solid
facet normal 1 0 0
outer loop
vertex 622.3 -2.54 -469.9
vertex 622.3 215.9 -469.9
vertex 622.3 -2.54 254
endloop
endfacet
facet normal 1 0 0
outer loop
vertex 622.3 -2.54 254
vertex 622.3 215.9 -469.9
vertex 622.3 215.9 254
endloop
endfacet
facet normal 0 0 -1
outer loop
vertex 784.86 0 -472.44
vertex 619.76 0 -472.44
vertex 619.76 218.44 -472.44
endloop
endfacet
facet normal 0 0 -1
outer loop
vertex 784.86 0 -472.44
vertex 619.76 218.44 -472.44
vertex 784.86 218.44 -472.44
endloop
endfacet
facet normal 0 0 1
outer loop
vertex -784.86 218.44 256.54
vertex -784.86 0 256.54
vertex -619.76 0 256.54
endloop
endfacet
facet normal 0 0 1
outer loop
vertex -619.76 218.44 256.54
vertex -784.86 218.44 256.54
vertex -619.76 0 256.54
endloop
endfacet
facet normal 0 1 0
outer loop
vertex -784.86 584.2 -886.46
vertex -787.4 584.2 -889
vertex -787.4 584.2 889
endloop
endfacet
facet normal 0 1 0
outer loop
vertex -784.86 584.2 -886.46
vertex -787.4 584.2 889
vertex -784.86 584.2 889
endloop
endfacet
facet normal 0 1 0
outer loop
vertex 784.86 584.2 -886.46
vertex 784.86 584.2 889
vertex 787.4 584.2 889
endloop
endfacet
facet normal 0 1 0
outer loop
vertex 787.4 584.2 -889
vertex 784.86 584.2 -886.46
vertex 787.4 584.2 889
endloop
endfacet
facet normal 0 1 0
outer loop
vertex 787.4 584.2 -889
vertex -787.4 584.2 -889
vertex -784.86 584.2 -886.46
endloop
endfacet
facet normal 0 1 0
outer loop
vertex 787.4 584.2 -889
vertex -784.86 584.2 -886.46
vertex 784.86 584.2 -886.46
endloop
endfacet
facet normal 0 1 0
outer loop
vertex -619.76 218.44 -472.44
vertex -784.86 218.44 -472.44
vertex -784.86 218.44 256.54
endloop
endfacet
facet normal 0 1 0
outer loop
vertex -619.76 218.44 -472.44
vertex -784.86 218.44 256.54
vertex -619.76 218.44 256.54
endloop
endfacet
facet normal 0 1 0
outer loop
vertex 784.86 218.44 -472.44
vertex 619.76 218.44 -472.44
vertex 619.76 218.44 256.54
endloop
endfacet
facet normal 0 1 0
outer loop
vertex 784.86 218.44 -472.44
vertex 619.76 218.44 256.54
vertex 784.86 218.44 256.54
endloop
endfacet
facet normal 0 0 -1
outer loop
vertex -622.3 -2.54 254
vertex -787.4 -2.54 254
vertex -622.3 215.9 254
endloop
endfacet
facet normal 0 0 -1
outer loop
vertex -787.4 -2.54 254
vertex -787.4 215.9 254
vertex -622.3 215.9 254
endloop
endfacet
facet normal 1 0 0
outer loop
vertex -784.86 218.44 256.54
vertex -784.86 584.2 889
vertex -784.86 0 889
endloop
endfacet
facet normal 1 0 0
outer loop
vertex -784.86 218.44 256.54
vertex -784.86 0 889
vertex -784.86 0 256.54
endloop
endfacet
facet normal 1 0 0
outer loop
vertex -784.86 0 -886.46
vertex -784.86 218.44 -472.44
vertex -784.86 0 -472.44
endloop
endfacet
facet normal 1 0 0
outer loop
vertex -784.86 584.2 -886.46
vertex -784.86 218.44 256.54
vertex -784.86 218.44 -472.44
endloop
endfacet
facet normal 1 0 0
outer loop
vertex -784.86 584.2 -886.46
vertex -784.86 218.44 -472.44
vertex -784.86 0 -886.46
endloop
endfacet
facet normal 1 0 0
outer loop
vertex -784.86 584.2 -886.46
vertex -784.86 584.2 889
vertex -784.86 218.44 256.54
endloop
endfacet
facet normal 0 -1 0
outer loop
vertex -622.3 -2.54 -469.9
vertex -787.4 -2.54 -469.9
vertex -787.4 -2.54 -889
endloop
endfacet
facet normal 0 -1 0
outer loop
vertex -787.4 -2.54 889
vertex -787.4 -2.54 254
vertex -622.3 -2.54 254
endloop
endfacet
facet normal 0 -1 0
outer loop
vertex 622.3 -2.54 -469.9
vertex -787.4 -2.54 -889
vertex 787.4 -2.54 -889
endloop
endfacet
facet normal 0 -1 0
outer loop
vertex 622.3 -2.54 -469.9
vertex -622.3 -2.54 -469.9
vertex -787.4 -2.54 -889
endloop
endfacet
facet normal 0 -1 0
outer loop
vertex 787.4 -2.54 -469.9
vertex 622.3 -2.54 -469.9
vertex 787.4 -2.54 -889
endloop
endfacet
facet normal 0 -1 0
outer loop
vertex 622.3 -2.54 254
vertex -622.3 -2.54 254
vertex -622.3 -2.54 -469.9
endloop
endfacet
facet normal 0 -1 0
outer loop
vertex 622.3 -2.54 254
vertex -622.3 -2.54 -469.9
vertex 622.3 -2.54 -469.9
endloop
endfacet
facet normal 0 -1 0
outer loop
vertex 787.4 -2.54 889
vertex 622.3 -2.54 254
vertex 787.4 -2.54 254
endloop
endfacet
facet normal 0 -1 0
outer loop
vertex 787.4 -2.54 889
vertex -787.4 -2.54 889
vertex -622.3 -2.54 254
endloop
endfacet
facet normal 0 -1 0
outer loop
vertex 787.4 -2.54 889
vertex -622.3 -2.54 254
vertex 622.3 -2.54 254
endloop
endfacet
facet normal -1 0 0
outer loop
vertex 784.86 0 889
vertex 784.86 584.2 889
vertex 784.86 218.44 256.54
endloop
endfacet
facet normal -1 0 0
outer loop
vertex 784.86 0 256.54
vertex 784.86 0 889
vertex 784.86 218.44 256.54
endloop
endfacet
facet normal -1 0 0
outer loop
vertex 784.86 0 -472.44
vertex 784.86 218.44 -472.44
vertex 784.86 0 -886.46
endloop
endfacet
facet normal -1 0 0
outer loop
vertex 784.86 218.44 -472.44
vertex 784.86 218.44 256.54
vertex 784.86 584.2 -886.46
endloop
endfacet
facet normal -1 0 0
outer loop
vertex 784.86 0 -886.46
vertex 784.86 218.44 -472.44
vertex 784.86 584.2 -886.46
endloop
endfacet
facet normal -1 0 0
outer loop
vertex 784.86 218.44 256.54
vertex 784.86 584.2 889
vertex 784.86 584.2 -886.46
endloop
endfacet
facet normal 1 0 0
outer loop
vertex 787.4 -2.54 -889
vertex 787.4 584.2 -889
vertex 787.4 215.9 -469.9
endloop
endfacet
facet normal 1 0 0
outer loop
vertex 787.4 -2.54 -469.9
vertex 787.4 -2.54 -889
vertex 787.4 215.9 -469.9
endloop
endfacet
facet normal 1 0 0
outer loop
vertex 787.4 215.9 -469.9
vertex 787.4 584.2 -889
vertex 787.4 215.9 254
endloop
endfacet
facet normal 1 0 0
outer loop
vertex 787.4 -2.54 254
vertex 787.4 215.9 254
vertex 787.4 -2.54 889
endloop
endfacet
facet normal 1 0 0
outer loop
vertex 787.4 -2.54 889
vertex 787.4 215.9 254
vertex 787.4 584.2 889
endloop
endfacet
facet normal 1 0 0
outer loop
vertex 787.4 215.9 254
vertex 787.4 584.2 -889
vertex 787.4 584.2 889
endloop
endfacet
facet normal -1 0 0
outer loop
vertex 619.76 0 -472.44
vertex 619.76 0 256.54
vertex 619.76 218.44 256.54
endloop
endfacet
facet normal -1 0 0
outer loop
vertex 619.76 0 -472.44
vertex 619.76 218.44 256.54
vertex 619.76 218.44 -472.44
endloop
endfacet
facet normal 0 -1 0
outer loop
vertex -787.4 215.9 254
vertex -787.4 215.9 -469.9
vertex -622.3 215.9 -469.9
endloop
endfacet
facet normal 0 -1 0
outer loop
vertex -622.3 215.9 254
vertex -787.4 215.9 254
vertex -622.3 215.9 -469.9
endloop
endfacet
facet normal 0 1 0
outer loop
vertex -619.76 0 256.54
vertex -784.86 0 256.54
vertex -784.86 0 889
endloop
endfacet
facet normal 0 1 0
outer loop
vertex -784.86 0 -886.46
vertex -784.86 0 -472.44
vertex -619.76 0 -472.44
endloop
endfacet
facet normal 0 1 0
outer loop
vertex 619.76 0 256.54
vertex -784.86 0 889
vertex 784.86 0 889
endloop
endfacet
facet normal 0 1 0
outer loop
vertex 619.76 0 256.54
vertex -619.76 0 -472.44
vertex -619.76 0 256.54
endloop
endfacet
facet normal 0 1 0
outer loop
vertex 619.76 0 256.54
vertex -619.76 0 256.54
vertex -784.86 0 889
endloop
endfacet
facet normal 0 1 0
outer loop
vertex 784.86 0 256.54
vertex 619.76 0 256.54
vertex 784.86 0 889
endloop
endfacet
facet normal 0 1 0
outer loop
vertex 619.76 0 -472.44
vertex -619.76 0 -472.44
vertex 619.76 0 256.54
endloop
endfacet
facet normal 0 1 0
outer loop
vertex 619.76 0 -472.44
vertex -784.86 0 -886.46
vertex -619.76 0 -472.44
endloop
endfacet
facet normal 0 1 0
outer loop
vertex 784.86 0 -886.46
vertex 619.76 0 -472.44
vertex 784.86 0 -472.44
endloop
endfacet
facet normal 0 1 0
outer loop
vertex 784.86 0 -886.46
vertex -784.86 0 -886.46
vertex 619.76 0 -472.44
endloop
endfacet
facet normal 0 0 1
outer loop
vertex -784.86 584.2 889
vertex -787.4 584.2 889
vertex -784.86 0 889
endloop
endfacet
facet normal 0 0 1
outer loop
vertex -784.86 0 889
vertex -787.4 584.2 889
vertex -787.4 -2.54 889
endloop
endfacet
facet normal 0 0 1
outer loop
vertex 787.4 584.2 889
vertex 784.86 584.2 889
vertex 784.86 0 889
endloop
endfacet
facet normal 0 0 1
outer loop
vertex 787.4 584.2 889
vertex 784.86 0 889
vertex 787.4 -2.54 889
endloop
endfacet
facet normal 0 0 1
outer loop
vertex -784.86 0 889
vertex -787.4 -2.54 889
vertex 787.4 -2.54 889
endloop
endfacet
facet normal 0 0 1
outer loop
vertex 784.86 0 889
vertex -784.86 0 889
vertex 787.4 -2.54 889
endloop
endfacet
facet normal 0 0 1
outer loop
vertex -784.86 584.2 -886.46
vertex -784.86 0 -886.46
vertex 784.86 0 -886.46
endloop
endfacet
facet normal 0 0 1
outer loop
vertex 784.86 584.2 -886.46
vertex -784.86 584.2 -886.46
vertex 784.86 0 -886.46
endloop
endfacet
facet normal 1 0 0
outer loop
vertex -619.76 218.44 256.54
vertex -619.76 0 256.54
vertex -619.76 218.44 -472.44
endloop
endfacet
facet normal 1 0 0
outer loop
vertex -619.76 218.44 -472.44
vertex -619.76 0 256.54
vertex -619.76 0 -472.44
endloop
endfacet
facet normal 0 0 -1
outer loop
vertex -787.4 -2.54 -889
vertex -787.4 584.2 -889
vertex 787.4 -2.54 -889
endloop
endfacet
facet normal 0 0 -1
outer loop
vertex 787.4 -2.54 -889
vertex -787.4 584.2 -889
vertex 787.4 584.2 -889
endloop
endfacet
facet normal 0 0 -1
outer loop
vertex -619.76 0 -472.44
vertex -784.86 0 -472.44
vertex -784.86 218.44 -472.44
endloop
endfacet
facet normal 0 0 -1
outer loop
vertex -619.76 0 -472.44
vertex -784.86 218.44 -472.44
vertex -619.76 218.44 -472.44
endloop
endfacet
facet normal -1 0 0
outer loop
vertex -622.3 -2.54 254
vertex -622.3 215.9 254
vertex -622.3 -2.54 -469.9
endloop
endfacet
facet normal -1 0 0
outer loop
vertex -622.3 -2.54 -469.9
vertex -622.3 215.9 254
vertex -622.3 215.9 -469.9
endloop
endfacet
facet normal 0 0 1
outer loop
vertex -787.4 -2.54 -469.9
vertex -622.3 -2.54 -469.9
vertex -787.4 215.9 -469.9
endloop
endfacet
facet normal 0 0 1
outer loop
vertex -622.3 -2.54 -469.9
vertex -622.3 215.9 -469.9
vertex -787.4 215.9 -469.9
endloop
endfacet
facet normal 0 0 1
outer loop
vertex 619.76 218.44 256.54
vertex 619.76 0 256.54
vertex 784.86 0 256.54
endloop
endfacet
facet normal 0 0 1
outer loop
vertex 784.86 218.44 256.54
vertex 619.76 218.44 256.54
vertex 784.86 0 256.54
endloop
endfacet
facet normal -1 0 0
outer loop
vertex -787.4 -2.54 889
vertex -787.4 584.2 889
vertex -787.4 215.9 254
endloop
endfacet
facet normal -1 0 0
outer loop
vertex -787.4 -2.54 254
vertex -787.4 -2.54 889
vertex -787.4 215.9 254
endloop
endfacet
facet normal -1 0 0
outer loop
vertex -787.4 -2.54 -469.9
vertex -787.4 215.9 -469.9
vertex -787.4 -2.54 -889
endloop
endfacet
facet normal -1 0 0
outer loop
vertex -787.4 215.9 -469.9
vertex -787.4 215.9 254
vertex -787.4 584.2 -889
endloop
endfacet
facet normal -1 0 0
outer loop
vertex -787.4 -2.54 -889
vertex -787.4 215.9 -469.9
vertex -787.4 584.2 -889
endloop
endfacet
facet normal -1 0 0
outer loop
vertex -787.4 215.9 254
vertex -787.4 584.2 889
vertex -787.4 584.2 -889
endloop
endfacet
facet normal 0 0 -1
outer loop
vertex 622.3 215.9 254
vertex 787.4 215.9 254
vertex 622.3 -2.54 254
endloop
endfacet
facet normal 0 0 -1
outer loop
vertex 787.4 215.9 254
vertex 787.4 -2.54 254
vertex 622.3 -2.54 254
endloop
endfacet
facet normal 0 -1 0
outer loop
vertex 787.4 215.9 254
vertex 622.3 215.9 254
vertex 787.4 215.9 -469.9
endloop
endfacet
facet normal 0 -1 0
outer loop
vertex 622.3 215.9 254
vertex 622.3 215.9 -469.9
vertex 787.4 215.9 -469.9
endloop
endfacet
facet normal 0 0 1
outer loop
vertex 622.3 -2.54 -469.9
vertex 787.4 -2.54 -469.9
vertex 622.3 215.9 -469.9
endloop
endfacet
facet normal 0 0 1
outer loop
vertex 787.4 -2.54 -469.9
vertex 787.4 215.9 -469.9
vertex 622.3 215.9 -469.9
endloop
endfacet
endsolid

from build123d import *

# Parameters (mm, degrees)
EXTRUDE_THIN1_DEPTH = 215.9
SKETCH4_W           = 167.64
SKETCH4_H           = 728.98
BOSS_EXTRUDE3_DEPTH = 2.54
SKETCH6_W           = 1574.8
SKETCH6_H           = 1778
SKETCH6_W_2         = 1569.72
SKETCH6_H_2         = 1772.92
BOSS_EXTRUDE4_DEPTH = 368.3
BOSS_EXTRUDE6_DEPTH = 2.54
SKETCH9_W           = 1569.72
SKETCH9_H           = 2.54
CUT_EXTRUDE1_DEPTH  = 584.2


with BuildPart() as part:
    # Sketch1 → Extrude-Thin1 (new body)
    with BuildSketch(Plane(origin=(0, 0, 0), x_dir=(1, 0, 0), z_dir=(0, 1, 0))):
        Polygon((787.4, 889), (-787.4, 889), (-787.4, 469.9), (-622.3, 469.9), (-622.3, -254), (-787.4, -254), (-787.4, -889), (787.4, -889), (787.4, -254), (622.3, -254), (622.3, 469.9), (787.4, 469.9), align=None)
        Polygon((784.86, 886.46), (-784.86, 886.46), (-784.86, 472.44), (-619.76, 472.44), (-619.76, -256.54), (-784.86, -256.54), (-784.86, -886.46), (784.86, -886.46), (784.86, -256.54), (619.76, -256.54), (619.76, 472.44), (784.86, 472.44), align=None, mode=Mode.SUBTRACT)
    extrude(amount=EXTRUDE_THIN1_DEPTH)

    # Sketch4 → Boss-Extrude3 (add)
    with BuildSketch(Plane(origin=(0, 215.9, 0), x_dir=(1, 0, 0), z_dir=(0, 1, 0))):
        with Locations((-703.58, 107.95)):
            Rectangle(SKETCH4_W, SKETCH4_H)
        with Locations((703.58, 107.95)):
            Rectangle(SKETCH4_W, SKETCH4_H)
    extrude(amount=BOSS_EXTRUDE3_DEPTH)

    # Sketch6 → Boss-Extrude4 (add)
    with BuildSketch(Plane(origin=(0, 215.9, 0), x_dir=(1, 0, 0), z_dir=(0, 1, 0))):
        Rectangle(SKETCH6_W, SKETCH6_H)
        Rectangle(SKETCH6_W_2, SKETCH6_H_2, mode=Mode.SUBTRACT)
    extrude(amount=BOSS_EXTRUDE4_DEPTH)

    # Sketch8 → Boss-Extrude6 (add)
    with BuildSketch(Plane.XZ):
        Polygon((787.4, -889), (787.4, -469.9), (622.3, -469.9), (622.3, 254), (787.4, 254), (787.4, 889), (-787.4, 889), (-787.4, 254), (-622.3, 254), (-622.3, -469.9), (-787.4, -469.9), (-787.4, -889), align=None)
    extrude(amount=BOSS_EXTRUDE6_DEPTH)

    # Sketch9 → Cut-Extrude1 (cut)
    with BuildSketch(Plane(origin=(0, 584.2, 0), x_dir=(1, 0, 0), z_dir=(0, 1, 0))):
        with Locations((0, -887.73)):
            Rectangle(SKETCH9_W, SKETCH9_H)
    extrude(amount=-CUT_EXTRUDE1_DEPTH, mode=Mode.SUBTRACT)


solid = part.part
